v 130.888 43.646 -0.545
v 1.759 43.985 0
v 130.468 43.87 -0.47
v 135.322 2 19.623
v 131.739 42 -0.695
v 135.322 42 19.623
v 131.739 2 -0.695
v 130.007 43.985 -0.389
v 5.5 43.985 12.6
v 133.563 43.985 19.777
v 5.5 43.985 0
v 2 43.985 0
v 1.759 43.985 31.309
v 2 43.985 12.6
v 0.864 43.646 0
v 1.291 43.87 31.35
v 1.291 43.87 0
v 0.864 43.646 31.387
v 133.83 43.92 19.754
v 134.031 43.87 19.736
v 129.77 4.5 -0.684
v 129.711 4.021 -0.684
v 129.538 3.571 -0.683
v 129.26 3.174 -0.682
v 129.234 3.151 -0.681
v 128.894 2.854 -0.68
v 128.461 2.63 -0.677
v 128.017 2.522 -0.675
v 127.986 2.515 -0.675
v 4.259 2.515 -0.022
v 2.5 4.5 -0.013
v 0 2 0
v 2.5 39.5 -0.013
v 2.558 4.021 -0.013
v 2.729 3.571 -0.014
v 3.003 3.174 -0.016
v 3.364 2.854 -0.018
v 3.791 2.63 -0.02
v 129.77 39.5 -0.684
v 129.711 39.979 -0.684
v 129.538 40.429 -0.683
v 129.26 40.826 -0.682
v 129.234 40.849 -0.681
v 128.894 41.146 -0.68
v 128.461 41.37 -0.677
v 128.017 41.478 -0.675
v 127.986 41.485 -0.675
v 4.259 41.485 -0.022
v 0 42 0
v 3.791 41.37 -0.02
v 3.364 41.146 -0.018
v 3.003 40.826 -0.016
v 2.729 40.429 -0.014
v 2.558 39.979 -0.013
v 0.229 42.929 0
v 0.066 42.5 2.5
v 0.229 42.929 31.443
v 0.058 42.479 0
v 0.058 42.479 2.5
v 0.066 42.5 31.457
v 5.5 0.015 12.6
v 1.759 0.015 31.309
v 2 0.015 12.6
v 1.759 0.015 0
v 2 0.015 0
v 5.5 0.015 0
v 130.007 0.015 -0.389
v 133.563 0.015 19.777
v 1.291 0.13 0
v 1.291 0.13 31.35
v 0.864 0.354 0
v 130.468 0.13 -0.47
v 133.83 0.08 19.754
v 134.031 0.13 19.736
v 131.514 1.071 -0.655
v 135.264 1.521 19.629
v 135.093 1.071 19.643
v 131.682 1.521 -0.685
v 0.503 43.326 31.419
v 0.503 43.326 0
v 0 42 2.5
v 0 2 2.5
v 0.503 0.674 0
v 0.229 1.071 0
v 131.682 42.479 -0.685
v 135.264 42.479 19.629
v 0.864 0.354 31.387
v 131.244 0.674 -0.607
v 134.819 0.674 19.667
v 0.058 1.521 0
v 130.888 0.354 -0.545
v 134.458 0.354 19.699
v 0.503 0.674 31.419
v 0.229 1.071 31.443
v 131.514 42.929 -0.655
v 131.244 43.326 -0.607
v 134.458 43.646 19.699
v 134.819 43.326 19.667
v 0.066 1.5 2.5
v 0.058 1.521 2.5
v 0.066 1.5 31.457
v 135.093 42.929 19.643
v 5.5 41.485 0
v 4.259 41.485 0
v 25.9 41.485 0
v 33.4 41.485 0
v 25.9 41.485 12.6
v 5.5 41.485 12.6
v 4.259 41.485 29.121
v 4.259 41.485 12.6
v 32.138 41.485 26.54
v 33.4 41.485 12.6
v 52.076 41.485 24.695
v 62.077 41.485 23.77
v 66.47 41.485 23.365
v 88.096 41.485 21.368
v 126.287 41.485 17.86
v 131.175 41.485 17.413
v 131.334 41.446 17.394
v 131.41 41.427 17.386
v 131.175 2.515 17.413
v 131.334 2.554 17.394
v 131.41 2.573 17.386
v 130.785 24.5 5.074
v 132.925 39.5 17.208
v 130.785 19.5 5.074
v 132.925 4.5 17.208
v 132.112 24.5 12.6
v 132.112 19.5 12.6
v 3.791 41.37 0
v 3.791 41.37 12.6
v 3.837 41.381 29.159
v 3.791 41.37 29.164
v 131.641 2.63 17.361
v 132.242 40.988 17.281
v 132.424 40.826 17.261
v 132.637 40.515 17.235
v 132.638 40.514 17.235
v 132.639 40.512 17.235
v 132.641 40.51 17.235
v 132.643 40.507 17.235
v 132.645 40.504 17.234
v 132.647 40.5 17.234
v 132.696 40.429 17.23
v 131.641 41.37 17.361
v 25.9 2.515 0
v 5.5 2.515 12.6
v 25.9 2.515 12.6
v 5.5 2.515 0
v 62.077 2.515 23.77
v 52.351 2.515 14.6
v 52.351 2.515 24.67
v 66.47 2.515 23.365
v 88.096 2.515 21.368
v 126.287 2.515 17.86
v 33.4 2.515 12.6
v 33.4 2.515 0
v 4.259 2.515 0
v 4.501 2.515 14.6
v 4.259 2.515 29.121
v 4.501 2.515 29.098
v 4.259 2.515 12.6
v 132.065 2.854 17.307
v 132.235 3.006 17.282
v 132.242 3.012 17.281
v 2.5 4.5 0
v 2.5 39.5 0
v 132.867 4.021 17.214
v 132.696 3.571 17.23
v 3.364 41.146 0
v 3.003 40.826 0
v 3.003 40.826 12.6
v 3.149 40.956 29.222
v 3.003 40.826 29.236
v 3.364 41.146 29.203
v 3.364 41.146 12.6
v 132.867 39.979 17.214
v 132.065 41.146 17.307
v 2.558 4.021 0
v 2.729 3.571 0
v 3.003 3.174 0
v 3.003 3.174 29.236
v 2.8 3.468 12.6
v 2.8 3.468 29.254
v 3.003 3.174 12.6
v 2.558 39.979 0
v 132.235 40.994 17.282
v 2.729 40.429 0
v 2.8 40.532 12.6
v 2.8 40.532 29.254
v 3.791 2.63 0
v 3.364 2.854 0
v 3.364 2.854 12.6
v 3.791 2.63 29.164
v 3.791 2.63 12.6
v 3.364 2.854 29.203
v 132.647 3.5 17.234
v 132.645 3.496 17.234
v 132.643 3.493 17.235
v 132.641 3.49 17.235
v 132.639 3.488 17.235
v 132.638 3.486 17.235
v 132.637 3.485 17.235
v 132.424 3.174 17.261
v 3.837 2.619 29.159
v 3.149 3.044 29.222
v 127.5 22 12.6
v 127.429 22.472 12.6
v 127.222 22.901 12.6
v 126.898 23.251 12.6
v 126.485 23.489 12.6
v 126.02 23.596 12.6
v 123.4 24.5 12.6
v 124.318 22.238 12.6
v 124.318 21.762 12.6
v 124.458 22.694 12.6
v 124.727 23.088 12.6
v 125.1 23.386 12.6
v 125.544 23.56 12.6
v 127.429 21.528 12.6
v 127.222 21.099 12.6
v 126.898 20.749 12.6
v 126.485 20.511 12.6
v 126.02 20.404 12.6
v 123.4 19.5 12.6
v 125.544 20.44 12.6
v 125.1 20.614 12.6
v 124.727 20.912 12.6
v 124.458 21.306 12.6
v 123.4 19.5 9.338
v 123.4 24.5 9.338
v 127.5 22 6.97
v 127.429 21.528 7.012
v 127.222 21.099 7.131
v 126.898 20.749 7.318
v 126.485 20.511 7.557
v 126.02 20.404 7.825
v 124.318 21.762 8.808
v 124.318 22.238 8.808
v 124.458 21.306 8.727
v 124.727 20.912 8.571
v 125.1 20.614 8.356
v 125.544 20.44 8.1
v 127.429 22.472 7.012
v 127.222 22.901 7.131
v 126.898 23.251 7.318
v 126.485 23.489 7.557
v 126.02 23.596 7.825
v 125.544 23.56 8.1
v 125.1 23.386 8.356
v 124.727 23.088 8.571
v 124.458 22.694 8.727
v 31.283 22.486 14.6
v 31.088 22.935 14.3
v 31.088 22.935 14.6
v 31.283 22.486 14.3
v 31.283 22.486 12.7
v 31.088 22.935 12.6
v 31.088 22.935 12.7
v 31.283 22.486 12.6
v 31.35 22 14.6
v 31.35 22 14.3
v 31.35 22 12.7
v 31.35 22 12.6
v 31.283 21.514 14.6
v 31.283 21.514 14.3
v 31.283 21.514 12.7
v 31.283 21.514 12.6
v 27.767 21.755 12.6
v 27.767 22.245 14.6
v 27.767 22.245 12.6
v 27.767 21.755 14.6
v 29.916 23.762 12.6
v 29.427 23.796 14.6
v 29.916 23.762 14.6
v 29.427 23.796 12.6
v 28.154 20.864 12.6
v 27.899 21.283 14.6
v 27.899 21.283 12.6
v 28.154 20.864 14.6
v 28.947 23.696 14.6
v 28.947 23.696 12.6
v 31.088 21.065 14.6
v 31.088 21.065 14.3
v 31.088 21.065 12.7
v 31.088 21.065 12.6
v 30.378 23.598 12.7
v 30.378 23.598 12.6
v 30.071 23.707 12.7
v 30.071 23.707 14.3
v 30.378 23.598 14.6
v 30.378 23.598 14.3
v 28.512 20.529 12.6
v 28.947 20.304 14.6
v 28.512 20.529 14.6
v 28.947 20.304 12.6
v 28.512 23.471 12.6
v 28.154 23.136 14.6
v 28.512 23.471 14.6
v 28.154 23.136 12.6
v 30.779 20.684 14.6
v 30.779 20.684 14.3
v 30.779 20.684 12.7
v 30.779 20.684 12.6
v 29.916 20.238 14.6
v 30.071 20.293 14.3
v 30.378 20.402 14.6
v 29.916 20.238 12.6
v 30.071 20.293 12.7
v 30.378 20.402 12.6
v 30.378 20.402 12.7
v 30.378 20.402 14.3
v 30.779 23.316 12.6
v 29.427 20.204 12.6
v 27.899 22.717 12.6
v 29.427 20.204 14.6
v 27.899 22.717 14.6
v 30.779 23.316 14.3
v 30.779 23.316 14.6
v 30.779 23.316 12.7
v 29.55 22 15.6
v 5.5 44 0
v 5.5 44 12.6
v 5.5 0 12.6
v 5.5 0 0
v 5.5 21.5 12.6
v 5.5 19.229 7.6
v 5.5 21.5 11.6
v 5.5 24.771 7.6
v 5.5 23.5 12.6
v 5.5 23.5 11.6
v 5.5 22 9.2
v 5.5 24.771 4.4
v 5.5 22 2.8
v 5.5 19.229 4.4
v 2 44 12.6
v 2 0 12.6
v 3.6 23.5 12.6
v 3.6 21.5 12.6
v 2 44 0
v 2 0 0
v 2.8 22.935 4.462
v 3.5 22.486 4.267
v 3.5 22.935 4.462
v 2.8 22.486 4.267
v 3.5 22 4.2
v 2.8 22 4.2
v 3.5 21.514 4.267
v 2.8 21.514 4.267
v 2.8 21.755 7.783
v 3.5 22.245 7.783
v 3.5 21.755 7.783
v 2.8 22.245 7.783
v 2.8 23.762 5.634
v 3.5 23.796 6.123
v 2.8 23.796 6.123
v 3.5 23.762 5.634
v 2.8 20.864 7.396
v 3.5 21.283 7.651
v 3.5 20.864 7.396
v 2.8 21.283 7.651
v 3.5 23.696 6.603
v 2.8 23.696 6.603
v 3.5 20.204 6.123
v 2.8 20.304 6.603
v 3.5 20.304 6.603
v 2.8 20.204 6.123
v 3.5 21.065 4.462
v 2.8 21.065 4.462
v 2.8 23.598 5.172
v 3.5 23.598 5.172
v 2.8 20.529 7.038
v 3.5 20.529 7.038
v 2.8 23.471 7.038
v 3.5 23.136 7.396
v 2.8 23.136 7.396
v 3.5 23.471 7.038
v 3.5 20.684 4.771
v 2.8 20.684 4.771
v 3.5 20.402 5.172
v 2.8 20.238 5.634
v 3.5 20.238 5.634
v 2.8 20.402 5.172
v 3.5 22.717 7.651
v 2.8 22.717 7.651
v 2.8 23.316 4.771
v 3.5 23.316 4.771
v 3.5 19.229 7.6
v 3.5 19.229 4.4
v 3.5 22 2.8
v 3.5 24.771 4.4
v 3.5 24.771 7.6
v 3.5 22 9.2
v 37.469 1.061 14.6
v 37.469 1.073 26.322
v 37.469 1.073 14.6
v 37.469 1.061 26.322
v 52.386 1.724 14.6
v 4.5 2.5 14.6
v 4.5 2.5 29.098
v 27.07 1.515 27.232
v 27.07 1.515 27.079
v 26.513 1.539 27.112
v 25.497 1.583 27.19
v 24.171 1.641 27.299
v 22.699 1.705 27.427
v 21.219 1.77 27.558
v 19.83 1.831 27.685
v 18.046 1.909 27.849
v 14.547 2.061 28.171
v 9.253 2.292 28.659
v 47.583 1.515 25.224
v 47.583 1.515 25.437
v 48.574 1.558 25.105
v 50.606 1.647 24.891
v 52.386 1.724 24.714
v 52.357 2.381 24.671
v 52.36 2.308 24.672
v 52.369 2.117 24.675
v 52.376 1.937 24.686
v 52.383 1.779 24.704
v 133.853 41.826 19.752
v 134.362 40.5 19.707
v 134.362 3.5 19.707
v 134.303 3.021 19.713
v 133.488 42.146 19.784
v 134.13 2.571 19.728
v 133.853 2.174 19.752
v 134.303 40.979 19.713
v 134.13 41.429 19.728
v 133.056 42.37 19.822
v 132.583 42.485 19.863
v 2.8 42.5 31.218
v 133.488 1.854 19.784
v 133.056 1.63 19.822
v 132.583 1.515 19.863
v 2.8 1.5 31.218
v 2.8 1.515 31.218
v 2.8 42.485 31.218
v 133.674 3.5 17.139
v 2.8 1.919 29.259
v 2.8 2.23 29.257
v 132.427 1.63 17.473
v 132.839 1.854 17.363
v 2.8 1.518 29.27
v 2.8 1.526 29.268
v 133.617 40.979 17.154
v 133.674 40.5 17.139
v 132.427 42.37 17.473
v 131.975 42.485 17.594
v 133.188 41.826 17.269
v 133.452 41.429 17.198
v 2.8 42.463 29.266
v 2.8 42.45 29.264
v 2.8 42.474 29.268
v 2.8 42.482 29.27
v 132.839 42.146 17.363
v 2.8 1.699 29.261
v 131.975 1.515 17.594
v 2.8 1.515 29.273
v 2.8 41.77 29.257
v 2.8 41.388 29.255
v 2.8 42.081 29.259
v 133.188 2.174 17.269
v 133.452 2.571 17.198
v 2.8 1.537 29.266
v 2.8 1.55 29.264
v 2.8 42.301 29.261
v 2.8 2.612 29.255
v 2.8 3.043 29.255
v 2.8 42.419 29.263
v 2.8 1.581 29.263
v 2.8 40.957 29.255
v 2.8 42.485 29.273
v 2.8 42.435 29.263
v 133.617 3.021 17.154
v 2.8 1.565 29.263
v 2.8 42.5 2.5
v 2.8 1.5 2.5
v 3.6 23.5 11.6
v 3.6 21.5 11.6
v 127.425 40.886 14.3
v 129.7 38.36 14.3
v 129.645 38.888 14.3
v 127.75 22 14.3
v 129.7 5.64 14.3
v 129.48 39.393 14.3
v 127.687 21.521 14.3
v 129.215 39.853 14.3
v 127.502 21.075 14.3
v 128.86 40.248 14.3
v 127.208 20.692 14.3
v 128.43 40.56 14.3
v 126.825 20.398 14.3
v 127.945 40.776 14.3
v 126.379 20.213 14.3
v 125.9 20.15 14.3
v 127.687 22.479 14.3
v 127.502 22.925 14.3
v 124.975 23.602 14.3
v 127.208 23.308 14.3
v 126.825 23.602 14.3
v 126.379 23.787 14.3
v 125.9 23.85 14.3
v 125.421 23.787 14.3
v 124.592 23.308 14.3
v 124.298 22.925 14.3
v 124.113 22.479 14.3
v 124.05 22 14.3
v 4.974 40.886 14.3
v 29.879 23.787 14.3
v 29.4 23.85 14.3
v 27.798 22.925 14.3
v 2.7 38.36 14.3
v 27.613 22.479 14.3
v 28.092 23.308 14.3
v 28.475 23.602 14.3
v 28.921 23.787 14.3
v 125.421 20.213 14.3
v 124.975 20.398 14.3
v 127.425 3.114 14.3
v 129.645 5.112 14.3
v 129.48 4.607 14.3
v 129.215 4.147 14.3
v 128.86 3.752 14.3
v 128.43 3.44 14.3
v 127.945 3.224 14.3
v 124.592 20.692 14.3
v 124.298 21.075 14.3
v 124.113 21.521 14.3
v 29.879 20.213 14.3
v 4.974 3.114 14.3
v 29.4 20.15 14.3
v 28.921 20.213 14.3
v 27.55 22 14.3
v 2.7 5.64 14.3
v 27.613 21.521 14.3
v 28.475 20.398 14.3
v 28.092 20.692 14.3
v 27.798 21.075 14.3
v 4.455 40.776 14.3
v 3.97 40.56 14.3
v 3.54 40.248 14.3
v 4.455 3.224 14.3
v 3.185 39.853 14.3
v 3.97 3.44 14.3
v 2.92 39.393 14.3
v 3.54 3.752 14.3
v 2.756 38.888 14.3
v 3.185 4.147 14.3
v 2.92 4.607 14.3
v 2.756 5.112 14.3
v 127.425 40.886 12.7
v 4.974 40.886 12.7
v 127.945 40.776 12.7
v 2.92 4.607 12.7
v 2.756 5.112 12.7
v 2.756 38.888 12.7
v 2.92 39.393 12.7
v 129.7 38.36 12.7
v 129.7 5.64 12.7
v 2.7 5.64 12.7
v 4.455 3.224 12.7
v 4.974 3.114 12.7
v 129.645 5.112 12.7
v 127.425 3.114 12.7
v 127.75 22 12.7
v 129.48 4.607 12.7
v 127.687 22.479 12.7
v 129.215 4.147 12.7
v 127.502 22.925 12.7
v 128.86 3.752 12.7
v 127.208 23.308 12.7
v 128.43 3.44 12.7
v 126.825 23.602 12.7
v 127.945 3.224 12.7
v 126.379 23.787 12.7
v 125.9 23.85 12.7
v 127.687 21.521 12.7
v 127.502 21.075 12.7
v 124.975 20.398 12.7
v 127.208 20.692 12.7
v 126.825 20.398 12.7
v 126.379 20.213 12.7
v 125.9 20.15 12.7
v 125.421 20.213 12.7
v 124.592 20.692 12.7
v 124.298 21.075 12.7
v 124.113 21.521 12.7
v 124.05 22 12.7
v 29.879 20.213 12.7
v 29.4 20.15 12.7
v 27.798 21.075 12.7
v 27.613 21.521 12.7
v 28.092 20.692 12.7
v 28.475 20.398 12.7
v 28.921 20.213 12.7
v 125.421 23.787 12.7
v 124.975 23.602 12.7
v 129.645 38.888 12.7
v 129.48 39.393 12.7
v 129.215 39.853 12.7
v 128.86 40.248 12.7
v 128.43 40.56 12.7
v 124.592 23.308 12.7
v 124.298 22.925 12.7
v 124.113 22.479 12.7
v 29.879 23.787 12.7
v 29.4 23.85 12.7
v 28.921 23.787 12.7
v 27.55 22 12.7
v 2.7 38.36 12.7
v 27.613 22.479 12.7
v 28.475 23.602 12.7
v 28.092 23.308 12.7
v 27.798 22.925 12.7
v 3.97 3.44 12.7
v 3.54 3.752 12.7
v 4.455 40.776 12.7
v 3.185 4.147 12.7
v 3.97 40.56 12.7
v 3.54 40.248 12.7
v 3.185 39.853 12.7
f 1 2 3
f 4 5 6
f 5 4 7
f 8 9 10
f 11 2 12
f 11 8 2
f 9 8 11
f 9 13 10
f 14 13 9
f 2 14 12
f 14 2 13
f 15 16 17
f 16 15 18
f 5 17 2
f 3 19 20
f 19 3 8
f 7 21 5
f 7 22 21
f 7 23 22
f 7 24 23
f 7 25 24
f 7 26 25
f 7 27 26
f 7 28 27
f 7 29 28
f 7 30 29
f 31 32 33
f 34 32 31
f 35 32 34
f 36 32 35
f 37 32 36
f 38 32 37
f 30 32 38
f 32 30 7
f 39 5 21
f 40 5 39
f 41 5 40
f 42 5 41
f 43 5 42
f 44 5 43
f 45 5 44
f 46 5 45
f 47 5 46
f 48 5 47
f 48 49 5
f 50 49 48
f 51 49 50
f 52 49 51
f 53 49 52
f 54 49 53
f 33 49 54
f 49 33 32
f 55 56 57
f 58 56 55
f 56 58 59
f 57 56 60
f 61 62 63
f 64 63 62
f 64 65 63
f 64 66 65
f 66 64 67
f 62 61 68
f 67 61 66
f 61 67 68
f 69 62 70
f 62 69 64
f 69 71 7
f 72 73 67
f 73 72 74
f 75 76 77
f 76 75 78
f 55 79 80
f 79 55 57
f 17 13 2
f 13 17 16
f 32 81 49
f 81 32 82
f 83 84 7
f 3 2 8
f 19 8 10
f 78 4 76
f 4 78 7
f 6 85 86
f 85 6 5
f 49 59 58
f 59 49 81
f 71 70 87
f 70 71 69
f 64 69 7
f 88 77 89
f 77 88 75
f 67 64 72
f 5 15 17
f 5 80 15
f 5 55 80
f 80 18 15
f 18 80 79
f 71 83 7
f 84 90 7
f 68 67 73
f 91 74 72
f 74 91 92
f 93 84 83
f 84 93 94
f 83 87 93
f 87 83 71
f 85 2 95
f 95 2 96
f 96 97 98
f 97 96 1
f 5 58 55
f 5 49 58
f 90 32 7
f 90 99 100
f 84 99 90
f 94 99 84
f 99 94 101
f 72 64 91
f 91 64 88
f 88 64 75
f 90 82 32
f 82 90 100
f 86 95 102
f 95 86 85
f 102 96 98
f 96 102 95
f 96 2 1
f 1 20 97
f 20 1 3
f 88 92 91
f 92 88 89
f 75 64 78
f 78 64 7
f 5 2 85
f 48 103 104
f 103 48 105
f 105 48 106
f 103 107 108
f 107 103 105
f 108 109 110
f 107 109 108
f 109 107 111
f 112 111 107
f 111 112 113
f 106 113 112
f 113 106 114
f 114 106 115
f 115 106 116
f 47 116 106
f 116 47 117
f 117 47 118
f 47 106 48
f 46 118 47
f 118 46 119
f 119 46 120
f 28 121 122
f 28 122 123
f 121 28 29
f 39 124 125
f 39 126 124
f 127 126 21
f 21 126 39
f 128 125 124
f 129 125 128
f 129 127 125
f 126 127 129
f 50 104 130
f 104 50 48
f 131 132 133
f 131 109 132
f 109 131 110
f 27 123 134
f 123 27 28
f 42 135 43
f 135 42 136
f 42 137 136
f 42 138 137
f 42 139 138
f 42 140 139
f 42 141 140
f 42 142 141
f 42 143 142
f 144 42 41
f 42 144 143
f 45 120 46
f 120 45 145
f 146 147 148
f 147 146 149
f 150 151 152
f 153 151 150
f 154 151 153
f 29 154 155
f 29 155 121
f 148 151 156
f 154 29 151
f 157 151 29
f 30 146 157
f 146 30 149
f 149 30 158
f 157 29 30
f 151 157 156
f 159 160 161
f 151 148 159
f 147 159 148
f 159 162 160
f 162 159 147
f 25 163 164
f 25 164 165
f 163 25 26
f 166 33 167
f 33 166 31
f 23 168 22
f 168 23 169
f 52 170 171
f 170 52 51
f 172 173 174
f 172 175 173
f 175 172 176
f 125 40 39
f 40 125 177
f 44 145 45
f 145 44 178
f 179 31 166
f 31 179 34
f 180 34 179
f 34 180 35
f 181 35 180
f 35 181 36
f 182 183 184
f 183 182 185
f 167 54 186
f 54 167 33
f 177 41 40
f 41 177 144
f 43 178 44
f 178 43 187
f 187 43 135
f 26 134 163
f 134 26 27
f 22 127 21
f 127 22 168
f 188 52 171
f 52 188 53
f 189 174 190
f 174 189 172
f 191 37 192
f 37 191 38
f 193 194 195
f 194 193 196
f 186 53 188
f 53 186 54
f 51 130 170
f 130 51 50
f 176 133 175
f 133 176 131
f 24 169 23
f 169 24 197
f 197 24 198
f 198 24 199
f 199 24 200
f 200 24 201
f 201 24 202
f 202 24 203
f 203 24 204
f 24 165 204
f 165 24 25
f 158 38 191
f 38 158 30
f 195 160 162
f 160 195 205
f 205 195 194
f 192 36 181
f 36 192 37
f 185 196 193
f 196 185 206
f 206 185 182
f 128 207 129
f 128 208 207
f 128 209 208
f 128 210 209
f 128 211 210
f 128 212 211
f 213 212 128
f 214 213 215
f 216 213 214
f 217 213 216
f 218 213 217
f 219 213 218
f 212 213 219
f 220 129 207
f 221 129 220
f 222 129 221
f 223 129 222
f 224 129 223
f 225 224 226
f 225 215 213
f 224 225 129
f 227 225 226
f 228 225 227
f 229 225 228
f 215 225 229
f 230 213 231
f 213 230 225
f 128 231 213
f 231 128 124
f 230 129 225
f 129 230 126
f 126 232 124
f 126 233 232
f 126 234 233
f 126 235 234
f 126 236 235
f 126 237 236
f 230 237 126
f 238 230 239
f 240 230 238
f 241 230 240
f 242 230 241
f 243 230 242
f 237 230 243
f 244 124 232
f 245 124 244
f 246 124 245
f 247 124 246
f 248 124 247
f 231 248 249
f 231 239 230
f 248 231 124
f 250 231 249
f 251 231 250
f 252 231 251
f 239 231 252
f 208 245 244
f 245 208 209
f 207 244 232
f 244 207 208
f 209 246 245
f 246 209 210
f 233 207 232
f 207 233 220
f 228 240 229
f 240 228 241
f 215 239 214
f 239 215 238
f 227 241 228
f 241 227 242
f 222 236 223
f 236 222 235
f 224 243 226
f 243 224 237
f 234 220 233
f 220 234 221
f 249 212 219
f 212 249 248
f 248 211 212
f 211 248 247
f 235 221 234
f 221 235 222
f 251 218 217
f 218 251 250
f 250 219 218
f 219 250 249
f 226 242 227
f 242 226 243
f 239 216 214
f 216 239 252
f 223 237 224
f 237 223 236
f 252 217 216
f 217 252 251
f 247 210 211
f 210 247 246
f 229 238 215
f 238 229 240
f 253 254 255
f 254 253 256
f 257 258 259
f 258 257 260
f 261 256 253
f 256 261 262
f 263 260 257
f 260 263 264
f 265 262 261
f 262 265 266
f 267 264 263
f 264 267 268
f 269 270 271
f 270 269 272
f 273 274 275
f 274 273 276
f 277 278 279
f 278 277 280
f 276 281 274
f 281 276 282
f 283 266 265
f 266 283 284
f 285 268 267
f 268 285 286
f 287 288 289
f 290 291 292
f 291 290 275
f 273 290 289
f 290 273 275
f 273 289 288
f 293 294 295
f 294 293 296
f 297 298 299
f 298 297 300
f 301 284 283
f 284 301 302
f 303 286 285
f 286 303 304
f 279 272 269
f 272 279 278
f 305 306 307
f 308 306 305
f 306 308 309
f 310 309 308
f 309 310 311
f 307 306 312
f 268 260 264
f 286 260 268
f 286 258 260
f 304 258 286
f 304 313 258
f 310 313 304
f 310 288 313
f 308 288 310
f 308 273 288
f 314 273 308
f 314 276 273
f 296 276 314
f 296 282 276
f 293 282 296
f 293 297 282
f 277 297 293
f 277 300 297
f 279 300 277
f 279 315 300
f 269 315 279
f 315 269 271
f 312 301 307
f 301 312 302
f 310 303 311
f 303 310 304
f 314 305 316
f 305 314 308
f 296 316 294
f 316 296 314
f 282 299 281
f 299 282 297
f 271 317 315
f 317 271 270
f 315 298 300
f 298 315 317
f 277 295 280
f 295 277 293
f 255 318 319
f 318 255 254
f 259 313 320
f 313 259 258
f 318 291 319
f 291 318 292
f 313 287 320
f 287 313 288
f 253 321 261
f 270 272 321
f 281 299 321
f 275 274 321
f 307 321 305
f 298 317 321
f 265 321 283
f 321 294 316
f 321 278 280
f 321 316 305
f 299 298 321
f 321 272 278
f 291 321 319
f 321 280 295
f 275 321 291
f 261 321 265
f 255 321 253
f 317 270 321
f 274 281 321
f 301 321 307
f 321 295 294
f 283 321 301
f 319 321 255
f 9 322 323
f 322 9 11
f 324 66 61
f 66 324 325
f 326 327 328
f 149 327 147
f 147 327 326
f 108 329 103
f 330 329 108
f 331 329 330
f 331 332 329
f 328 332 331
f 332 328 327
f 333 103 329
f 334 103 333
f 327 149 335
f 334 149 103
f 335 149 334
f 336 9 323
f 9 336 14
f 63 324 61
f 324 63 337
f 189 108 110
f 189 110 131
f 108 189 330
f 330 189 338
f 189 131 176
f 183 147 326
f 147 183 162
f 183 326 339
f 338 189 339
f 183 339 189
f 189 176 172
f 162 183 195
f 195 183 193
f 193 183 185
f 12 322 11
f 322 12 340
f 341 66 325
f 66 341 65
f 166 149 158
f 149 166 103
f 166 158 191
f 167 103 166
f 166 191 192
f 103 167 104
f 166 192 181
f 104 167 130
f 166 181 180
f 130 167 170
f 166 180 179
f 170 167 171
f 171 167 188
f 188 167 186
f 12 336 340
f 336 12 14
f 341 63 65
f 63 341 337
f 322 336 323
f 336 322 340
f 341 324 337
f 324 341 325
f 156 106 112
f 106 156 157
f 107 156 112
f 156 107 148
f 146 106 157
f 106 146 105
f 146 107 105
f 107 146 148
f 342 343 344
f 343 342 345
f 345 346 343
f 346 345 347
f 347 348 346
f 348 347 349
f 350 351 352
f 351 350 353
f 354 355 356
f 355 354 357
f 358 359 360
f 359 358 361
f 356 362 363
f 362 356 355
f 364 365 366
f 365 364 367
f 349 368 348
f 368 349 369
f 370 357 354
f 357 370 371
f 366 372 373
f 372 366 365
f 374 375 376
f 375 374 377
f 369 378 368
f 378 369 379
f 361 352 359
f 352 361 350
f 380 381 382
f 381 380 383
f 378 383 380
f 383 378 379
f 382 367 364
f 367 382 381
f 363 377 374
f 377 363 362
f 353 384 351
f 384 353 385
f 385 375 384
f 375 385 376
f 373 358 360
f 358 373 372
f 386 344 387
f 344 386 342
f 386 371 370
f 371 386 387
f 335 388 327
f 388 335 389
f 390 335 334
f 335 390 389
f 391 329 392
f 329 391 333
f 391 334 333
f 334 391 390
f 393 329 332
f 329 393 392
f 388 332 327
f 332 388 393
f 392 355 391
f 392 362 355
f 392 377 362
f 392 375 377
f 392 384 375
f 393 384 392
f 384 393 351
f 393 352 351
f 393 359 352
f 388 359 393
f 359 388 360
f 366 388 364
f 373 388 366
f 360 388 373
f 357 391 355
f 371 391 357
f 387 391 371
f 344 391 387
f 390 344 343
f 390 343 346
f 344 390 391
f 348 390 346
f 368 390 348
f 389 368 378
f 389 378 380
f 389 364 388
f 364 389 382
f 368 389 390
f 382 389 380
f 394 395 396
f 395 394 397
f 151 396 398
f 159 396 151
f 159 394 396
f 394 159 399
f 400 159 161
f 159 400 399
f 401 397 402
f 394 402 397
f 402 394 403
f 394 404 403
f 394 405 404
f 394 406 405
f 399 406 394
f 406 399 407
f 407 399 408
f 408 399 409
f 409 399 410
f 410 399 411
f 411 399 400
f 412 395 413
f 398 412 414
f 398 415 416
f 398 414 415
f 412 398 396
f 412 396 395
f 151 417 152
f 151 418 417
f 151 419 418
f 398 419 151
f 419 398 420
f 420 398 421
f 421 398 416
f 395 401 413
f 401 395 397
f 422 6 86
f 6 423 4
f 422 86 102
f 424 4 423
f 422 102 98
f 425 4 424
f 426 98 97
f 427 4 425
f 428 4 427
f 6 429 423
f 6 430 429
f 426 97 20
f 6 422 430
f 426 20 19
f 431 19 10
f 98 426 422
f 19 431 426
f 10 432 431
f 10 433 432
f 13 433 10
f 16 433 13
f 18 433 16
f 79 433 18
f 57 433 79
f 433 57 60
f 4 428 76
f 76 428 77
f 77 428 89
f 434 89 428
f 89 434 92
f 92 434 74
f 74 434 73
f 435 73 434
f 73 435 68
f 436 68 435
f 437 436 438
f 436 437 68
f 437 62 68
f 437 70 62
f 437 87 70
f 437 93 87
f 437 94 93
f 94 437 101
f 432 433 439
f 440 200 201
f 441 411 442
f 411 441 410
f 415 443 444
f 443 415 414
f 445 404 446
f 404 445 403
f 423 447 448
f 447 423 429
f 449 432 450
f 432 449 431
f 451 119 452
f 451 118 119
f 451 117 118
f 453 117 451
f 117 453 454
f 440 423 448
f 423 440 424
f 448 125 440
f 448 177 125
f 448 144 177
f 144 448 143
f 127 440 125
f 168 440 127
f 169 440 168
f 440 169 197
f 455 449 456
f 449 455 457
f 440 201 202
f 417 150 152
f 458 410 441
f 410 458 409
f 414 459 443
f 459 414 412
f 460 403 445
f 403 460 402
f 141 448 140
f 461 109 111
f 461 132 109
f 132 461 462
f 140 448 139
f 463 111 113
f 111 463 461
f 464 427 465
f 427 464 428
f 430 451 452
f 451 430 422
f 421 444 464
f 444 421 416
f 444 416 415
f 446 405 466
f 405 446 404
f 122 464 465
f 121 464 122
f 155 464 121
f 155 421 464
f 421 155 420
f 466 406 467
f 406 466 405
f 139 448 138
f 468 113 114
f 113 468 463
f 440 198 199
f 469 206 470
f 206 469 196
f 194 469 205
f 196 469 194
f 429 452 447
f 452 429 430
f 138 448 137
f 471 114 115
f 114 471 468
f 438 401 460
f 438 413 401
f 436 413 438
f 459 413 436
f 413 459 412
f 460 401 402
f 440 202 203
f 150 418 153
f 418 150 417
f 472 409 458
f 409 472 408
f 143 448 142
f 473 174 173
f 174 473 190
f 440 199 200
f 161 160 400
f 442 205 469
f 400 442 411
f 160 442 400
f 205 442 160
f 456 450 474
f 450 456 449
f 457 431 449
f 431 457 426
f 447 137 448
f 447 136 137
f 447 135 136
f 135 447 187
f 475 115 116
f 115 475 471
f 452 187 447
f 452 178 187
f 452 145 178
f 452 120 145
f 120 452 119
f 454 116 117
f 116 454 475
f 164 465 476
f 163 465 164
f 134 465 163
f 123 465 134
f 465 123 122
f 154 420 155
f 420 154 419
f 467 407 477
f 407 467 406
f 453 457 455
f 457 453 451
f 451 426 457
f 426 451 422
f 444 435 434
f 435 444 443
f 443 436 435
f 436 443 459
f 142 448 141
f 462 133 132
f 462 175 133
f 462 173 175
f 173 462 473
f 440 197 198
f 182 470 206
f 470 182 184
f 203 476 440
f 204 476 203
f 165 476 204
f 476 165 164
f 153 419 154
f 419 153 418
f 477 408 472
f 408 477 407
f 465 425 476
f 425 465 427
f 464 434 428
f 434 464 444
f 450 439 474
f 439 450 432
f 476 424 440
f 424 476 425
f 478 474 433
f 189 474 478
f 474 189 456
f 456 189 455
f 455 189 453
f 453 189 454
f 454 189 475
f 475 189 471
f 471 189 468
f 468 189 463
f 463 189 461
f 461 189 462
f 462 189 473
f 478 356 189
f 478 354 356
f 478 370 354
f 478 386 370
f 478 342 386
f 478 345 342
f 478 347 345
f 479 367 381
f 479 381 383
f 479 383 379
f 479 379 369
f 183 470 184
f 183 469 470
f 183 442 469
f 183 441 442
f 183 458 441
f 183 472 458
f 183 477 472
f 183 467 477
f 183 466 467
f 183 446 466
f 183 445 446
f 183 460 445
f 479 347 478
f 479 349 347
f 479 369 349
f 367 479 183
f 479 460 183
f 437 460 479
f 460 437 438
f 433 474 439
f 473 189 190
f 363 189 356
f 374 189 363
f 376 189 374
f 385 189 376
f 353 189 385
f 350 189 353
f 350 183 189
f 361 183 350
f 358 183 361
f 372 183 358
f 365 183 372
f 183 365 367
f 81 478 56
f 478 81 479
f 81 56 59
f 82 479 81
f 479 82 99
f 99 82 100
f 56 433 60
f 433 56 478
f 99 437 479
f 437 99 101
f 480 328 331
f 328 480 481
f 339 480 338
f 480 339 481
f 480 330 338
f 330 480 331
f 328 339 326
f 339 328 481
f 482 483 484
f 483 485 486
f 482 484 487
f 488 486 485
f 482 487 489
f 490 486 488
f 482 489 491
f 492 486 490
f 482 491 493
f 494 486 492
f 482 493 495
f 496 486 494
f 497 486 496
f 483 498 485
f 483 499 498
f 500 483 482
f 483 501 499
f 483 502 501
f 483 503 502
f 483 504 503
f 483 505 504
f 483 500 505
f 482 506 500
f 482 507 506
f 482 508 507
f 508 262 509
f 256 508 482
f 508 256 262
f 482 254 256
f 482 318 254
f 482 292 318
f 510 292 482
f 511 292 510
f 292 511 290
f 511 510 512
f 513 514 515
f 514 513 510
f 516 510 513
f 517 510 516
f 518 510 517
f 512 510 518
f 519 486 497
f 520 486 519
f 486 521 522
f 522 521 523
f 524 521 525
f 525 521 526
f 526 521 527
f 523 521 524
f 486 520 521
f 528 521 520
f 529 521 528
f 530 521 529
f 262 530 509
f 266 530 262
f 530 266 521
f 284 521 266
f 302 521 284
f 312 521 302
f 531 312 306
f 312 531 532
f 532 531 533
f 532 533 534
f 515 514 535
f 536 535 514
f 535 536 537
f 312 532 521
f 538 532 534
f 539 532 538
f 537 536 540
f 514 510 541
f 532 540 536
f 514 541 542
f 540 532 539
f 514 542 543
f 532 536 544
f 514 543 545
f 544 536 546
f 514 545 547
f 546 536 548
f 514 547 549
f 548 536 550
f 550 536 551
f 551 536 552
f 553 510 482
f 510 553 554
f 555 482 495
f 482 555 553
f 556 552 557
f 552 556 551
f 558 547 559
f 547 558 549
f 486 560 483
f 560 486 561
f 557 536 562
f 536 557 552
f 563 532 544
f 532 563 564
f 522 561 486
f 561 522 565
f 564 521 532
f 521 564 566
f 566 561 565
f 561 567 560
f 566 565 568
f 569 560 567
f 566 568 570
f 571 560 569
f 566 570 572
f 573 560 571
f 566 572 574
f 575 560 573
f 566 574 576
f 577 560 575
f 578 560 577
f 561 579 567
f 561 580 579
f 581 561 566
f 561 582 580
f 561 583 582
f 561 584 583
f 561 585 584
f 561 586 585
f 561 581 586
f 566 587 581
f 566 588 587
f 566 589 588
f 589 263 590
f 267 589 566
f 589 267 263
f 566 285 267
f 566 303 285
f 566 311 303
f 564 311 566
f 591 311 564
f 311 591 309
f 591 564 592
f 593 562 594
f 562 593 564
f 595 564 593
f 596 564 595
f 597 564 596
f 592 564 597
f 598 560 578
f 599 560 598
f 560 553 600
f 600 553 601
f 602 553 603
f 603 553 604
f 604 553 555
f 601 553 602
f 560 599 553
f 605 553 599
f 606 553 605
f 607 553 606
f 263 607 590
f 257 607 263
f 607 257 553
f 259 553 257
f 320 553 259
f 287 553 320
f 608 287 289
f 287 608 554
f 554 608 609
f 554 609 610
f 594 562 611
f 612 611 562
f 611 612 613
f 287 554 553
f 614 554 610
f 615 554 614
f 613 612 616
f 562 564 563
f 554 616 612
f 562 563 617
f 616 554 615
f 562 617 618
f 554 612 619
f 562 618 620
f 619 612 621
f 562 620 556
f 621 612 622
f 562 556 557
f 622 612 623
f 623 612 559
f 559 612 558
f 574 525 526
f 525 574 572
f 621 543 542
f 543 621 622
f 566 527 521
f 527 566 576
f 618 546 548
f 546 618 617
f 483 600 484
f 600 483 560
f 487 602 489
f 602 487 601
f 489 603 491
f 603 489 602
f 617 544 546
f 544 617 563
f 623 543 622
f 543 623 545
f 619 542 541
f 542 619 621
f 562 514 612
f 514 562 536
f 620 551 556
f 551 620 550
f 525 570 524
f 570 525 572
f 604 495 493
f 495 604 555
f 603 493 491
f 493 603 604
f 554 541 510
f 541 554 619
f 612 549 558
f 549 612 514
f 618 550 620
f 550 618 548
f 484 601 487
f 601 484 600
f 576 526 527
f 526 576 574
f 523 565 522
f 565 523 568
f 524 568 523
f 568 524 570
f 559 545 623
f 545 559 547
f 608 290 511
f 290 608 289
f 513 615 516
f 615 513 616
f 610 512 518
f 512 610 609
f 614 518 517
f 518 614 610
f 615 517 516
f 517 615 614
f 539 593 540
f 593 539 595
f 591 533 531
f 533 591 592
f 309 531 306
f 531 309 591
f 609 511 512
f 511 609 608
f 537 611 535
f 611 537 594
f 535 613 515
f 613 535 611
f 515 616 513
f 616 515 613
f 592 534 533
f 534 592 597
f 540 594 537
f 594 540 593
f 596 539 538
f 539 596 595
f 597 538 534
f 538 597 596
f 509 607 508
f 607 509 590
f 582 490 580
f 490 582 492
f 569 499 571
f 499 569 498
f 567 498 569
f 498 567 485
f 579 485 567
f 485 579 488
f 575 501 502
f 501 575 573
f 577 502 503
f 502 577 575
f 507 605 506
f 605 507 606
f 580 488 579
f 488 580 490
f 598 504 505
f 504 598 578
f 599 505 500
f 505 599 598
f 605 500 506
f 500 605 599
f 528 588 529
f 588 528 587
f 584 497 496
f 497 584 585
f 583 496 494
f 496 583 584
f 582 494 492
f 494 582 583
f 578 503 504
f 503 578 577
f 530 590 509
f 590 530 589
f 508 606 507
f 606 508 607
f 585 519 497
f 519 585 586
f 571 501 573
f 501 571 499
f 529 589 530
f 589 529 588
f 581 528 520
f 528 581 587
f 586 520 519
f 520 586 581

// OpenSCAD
// file: wall_shape.scad
module wall_shape(l, w, h, t, r) {
  module fb_wall() {
    union() {
      translate([r, r, 0]) {
        cylinder(h=h + 2*r, r=r);
        translate([0, w - 2*r, 0])
          cylinder(h=h + 2*r, r=r);
      }
    }
  }

  hull() {
    fb_wall();
    translate([l - 2*r, 0, 0])
      rotate([0, 10, 0])
        fb_wall();
  }
}
// file: top.scad
include <wall_shape.scad>;

hole_rad = 1.8;  // Holes in PCB, ample room for M3.
depth_to_pcb = 12.6;
module top(l, w, h, t, r, hole_height) {
  color("silver")
  difference() {
    union() {
      // Outer walls.
      difference() {
        // Larger outer shape.
        wall_shape(l + 2*t, w + 2*t, h, t, r);
        // Minus inner shape.
        translate([t, t, -3]) wall_shape(l, w, h+6, t, r);
      }

      // Spacer behind 1st row.
      translate([r, 0, 0]) cube([5.5 - r, w + 2*t, depth_to_pcb]);
      // Spacer between 1st and 2nd rows.
      translate([25.9, t/2, 0]) cube([7.5, w + t, depth_to_pcb]);

      // Front support, for bottom to screw into.
      translate([l - 3.4, t + w/2 - 2.5, depth_to_pcb - 8]) difference() {
        cube([9, 5, 8]);
        translate([-8, -1, -4.5]) rotate([0, 30, 0]) cube([12, 7, 12]);
        // Hole sized to directly accept M3 threads, no hardware (no room!).
        translate([2.5, 2.5, 0]) cylinder(r=hole_rad - 0.2, h=10);
      };

      // Rear peg slotting into that hole from the first spacer.
      translate([25.8 + 7.5/2, t + w/2, depth_to_pcb]) {
        cylinder(r=hole_rad, h=2);
        translate([0, 0, 2]) cylinder(r1=hole_rad, r2=0, h=1);
      }
    };

    // Minus the angled bottom.
    translate([-5, -5, h]) rotate([0, 5, 0]) cube([l+20, w+20, h]);

    // Inset for the bottom plate to fit into.
    translate([t - 1, t - 1, h - t]) rotate([0, 5, 0])
      translate([-5, 0, 0]) wall_shape(l + 11, w + 2, 10, t, r);

    // Inset for back to fit into.
    translate([-1, t - 1, t]) cube([1.3+t, w + 2, h - t*2/3 + 5]);
    // Plus a small cutout for space where PCB pins stick out.
    translate([3.6, t + w/2 - 0.5, depth_to_pcb - 1.0]) cube([2, 2, 2]);

    // Hole for mounting screw.
    rotate([0, 90, 0]) translate([-hole_height, t + w/2, -1]) {
      cylinder(r=hole_rad, h=9);  // Hole.
      translate([0, 0, 4.5]) cylinder(d=6.4, h=3, $fn=6);  // Nut cutout.
    };

    // Work around for first logic PCB misalignment, cut out space where
    // it unintentionally sticks out.
    difference() {
      translate([t + 2, t, depth_to_pcb + 2]) {
        rotate([0, 0, -2.5]) cube([33, 4, 20]);
        translate([32.9, -1.43, 0]) rotate([0, 0, 2.5]) cube([15, 4, 20]);
      };

      translate([0,0, h - 2.3]) rotate([0, 5, 0]) cube([60, 10, 10]);
    };
  }
}
// file: pcbs.scad
// Length and width of the PCB.
pl = 127.0;
pw = 37.8;
// Difference in case to PCB position from the origin (back of model).
pcb_origin_diff = 2.7;
// Radius of PCB's rounded corners.
pr = 2.54;

module key_pcb() {
  color([0, 0.4, 0, 0.5])
  translate([pr + pcb_origin_diff, pr+ct+(cw-pw)/2, 12.7]) {
    difference() {
      hull() {
        for(x = [0, pl-2*pr]) {
          for(y = [0, pw-2*pr]) {
            translate([x, y, 0]) cylinder(r=pr, h=1.6);
          }
        }
      };

      // Hole between the 1st and second rows.
      translate([-pr + 26.7, -pr + pw/2, -1]) cylinder(d=3.7, h=4);
      // Hole near the last row.
      translate([-pr + 123.2, -pr + pw/2, -1]) cylinder(d=3.7, h=4);
    }
  };
};
// main file
include <pcbs.scad>;
include <top.scad>;

$fs = 0.5;

// Length and width of the the case('s inside, plus t for thickness on 4 sides).
// The length takes into account the ten degree pitch.  Length is at the
// bottom surface in the model, which is the top (by the keys).
cl = 129.5 - pcb_origin_diff;
cw = 39.0;
// TODO: An extra 0.2mm thickness to make the connector(s) flush, slightly more
// if I want to try to hide their edges.

// Tallest height, outer wall thickness, corner rounding radius of the case.
ch = 31.9;
ct = 2.5;
cr = 2;

// Height from origin for mounting hole in the back.
hole_height = 6;

top(cl, cw, ch, ct, cr, hole_height);
key_pcb();
